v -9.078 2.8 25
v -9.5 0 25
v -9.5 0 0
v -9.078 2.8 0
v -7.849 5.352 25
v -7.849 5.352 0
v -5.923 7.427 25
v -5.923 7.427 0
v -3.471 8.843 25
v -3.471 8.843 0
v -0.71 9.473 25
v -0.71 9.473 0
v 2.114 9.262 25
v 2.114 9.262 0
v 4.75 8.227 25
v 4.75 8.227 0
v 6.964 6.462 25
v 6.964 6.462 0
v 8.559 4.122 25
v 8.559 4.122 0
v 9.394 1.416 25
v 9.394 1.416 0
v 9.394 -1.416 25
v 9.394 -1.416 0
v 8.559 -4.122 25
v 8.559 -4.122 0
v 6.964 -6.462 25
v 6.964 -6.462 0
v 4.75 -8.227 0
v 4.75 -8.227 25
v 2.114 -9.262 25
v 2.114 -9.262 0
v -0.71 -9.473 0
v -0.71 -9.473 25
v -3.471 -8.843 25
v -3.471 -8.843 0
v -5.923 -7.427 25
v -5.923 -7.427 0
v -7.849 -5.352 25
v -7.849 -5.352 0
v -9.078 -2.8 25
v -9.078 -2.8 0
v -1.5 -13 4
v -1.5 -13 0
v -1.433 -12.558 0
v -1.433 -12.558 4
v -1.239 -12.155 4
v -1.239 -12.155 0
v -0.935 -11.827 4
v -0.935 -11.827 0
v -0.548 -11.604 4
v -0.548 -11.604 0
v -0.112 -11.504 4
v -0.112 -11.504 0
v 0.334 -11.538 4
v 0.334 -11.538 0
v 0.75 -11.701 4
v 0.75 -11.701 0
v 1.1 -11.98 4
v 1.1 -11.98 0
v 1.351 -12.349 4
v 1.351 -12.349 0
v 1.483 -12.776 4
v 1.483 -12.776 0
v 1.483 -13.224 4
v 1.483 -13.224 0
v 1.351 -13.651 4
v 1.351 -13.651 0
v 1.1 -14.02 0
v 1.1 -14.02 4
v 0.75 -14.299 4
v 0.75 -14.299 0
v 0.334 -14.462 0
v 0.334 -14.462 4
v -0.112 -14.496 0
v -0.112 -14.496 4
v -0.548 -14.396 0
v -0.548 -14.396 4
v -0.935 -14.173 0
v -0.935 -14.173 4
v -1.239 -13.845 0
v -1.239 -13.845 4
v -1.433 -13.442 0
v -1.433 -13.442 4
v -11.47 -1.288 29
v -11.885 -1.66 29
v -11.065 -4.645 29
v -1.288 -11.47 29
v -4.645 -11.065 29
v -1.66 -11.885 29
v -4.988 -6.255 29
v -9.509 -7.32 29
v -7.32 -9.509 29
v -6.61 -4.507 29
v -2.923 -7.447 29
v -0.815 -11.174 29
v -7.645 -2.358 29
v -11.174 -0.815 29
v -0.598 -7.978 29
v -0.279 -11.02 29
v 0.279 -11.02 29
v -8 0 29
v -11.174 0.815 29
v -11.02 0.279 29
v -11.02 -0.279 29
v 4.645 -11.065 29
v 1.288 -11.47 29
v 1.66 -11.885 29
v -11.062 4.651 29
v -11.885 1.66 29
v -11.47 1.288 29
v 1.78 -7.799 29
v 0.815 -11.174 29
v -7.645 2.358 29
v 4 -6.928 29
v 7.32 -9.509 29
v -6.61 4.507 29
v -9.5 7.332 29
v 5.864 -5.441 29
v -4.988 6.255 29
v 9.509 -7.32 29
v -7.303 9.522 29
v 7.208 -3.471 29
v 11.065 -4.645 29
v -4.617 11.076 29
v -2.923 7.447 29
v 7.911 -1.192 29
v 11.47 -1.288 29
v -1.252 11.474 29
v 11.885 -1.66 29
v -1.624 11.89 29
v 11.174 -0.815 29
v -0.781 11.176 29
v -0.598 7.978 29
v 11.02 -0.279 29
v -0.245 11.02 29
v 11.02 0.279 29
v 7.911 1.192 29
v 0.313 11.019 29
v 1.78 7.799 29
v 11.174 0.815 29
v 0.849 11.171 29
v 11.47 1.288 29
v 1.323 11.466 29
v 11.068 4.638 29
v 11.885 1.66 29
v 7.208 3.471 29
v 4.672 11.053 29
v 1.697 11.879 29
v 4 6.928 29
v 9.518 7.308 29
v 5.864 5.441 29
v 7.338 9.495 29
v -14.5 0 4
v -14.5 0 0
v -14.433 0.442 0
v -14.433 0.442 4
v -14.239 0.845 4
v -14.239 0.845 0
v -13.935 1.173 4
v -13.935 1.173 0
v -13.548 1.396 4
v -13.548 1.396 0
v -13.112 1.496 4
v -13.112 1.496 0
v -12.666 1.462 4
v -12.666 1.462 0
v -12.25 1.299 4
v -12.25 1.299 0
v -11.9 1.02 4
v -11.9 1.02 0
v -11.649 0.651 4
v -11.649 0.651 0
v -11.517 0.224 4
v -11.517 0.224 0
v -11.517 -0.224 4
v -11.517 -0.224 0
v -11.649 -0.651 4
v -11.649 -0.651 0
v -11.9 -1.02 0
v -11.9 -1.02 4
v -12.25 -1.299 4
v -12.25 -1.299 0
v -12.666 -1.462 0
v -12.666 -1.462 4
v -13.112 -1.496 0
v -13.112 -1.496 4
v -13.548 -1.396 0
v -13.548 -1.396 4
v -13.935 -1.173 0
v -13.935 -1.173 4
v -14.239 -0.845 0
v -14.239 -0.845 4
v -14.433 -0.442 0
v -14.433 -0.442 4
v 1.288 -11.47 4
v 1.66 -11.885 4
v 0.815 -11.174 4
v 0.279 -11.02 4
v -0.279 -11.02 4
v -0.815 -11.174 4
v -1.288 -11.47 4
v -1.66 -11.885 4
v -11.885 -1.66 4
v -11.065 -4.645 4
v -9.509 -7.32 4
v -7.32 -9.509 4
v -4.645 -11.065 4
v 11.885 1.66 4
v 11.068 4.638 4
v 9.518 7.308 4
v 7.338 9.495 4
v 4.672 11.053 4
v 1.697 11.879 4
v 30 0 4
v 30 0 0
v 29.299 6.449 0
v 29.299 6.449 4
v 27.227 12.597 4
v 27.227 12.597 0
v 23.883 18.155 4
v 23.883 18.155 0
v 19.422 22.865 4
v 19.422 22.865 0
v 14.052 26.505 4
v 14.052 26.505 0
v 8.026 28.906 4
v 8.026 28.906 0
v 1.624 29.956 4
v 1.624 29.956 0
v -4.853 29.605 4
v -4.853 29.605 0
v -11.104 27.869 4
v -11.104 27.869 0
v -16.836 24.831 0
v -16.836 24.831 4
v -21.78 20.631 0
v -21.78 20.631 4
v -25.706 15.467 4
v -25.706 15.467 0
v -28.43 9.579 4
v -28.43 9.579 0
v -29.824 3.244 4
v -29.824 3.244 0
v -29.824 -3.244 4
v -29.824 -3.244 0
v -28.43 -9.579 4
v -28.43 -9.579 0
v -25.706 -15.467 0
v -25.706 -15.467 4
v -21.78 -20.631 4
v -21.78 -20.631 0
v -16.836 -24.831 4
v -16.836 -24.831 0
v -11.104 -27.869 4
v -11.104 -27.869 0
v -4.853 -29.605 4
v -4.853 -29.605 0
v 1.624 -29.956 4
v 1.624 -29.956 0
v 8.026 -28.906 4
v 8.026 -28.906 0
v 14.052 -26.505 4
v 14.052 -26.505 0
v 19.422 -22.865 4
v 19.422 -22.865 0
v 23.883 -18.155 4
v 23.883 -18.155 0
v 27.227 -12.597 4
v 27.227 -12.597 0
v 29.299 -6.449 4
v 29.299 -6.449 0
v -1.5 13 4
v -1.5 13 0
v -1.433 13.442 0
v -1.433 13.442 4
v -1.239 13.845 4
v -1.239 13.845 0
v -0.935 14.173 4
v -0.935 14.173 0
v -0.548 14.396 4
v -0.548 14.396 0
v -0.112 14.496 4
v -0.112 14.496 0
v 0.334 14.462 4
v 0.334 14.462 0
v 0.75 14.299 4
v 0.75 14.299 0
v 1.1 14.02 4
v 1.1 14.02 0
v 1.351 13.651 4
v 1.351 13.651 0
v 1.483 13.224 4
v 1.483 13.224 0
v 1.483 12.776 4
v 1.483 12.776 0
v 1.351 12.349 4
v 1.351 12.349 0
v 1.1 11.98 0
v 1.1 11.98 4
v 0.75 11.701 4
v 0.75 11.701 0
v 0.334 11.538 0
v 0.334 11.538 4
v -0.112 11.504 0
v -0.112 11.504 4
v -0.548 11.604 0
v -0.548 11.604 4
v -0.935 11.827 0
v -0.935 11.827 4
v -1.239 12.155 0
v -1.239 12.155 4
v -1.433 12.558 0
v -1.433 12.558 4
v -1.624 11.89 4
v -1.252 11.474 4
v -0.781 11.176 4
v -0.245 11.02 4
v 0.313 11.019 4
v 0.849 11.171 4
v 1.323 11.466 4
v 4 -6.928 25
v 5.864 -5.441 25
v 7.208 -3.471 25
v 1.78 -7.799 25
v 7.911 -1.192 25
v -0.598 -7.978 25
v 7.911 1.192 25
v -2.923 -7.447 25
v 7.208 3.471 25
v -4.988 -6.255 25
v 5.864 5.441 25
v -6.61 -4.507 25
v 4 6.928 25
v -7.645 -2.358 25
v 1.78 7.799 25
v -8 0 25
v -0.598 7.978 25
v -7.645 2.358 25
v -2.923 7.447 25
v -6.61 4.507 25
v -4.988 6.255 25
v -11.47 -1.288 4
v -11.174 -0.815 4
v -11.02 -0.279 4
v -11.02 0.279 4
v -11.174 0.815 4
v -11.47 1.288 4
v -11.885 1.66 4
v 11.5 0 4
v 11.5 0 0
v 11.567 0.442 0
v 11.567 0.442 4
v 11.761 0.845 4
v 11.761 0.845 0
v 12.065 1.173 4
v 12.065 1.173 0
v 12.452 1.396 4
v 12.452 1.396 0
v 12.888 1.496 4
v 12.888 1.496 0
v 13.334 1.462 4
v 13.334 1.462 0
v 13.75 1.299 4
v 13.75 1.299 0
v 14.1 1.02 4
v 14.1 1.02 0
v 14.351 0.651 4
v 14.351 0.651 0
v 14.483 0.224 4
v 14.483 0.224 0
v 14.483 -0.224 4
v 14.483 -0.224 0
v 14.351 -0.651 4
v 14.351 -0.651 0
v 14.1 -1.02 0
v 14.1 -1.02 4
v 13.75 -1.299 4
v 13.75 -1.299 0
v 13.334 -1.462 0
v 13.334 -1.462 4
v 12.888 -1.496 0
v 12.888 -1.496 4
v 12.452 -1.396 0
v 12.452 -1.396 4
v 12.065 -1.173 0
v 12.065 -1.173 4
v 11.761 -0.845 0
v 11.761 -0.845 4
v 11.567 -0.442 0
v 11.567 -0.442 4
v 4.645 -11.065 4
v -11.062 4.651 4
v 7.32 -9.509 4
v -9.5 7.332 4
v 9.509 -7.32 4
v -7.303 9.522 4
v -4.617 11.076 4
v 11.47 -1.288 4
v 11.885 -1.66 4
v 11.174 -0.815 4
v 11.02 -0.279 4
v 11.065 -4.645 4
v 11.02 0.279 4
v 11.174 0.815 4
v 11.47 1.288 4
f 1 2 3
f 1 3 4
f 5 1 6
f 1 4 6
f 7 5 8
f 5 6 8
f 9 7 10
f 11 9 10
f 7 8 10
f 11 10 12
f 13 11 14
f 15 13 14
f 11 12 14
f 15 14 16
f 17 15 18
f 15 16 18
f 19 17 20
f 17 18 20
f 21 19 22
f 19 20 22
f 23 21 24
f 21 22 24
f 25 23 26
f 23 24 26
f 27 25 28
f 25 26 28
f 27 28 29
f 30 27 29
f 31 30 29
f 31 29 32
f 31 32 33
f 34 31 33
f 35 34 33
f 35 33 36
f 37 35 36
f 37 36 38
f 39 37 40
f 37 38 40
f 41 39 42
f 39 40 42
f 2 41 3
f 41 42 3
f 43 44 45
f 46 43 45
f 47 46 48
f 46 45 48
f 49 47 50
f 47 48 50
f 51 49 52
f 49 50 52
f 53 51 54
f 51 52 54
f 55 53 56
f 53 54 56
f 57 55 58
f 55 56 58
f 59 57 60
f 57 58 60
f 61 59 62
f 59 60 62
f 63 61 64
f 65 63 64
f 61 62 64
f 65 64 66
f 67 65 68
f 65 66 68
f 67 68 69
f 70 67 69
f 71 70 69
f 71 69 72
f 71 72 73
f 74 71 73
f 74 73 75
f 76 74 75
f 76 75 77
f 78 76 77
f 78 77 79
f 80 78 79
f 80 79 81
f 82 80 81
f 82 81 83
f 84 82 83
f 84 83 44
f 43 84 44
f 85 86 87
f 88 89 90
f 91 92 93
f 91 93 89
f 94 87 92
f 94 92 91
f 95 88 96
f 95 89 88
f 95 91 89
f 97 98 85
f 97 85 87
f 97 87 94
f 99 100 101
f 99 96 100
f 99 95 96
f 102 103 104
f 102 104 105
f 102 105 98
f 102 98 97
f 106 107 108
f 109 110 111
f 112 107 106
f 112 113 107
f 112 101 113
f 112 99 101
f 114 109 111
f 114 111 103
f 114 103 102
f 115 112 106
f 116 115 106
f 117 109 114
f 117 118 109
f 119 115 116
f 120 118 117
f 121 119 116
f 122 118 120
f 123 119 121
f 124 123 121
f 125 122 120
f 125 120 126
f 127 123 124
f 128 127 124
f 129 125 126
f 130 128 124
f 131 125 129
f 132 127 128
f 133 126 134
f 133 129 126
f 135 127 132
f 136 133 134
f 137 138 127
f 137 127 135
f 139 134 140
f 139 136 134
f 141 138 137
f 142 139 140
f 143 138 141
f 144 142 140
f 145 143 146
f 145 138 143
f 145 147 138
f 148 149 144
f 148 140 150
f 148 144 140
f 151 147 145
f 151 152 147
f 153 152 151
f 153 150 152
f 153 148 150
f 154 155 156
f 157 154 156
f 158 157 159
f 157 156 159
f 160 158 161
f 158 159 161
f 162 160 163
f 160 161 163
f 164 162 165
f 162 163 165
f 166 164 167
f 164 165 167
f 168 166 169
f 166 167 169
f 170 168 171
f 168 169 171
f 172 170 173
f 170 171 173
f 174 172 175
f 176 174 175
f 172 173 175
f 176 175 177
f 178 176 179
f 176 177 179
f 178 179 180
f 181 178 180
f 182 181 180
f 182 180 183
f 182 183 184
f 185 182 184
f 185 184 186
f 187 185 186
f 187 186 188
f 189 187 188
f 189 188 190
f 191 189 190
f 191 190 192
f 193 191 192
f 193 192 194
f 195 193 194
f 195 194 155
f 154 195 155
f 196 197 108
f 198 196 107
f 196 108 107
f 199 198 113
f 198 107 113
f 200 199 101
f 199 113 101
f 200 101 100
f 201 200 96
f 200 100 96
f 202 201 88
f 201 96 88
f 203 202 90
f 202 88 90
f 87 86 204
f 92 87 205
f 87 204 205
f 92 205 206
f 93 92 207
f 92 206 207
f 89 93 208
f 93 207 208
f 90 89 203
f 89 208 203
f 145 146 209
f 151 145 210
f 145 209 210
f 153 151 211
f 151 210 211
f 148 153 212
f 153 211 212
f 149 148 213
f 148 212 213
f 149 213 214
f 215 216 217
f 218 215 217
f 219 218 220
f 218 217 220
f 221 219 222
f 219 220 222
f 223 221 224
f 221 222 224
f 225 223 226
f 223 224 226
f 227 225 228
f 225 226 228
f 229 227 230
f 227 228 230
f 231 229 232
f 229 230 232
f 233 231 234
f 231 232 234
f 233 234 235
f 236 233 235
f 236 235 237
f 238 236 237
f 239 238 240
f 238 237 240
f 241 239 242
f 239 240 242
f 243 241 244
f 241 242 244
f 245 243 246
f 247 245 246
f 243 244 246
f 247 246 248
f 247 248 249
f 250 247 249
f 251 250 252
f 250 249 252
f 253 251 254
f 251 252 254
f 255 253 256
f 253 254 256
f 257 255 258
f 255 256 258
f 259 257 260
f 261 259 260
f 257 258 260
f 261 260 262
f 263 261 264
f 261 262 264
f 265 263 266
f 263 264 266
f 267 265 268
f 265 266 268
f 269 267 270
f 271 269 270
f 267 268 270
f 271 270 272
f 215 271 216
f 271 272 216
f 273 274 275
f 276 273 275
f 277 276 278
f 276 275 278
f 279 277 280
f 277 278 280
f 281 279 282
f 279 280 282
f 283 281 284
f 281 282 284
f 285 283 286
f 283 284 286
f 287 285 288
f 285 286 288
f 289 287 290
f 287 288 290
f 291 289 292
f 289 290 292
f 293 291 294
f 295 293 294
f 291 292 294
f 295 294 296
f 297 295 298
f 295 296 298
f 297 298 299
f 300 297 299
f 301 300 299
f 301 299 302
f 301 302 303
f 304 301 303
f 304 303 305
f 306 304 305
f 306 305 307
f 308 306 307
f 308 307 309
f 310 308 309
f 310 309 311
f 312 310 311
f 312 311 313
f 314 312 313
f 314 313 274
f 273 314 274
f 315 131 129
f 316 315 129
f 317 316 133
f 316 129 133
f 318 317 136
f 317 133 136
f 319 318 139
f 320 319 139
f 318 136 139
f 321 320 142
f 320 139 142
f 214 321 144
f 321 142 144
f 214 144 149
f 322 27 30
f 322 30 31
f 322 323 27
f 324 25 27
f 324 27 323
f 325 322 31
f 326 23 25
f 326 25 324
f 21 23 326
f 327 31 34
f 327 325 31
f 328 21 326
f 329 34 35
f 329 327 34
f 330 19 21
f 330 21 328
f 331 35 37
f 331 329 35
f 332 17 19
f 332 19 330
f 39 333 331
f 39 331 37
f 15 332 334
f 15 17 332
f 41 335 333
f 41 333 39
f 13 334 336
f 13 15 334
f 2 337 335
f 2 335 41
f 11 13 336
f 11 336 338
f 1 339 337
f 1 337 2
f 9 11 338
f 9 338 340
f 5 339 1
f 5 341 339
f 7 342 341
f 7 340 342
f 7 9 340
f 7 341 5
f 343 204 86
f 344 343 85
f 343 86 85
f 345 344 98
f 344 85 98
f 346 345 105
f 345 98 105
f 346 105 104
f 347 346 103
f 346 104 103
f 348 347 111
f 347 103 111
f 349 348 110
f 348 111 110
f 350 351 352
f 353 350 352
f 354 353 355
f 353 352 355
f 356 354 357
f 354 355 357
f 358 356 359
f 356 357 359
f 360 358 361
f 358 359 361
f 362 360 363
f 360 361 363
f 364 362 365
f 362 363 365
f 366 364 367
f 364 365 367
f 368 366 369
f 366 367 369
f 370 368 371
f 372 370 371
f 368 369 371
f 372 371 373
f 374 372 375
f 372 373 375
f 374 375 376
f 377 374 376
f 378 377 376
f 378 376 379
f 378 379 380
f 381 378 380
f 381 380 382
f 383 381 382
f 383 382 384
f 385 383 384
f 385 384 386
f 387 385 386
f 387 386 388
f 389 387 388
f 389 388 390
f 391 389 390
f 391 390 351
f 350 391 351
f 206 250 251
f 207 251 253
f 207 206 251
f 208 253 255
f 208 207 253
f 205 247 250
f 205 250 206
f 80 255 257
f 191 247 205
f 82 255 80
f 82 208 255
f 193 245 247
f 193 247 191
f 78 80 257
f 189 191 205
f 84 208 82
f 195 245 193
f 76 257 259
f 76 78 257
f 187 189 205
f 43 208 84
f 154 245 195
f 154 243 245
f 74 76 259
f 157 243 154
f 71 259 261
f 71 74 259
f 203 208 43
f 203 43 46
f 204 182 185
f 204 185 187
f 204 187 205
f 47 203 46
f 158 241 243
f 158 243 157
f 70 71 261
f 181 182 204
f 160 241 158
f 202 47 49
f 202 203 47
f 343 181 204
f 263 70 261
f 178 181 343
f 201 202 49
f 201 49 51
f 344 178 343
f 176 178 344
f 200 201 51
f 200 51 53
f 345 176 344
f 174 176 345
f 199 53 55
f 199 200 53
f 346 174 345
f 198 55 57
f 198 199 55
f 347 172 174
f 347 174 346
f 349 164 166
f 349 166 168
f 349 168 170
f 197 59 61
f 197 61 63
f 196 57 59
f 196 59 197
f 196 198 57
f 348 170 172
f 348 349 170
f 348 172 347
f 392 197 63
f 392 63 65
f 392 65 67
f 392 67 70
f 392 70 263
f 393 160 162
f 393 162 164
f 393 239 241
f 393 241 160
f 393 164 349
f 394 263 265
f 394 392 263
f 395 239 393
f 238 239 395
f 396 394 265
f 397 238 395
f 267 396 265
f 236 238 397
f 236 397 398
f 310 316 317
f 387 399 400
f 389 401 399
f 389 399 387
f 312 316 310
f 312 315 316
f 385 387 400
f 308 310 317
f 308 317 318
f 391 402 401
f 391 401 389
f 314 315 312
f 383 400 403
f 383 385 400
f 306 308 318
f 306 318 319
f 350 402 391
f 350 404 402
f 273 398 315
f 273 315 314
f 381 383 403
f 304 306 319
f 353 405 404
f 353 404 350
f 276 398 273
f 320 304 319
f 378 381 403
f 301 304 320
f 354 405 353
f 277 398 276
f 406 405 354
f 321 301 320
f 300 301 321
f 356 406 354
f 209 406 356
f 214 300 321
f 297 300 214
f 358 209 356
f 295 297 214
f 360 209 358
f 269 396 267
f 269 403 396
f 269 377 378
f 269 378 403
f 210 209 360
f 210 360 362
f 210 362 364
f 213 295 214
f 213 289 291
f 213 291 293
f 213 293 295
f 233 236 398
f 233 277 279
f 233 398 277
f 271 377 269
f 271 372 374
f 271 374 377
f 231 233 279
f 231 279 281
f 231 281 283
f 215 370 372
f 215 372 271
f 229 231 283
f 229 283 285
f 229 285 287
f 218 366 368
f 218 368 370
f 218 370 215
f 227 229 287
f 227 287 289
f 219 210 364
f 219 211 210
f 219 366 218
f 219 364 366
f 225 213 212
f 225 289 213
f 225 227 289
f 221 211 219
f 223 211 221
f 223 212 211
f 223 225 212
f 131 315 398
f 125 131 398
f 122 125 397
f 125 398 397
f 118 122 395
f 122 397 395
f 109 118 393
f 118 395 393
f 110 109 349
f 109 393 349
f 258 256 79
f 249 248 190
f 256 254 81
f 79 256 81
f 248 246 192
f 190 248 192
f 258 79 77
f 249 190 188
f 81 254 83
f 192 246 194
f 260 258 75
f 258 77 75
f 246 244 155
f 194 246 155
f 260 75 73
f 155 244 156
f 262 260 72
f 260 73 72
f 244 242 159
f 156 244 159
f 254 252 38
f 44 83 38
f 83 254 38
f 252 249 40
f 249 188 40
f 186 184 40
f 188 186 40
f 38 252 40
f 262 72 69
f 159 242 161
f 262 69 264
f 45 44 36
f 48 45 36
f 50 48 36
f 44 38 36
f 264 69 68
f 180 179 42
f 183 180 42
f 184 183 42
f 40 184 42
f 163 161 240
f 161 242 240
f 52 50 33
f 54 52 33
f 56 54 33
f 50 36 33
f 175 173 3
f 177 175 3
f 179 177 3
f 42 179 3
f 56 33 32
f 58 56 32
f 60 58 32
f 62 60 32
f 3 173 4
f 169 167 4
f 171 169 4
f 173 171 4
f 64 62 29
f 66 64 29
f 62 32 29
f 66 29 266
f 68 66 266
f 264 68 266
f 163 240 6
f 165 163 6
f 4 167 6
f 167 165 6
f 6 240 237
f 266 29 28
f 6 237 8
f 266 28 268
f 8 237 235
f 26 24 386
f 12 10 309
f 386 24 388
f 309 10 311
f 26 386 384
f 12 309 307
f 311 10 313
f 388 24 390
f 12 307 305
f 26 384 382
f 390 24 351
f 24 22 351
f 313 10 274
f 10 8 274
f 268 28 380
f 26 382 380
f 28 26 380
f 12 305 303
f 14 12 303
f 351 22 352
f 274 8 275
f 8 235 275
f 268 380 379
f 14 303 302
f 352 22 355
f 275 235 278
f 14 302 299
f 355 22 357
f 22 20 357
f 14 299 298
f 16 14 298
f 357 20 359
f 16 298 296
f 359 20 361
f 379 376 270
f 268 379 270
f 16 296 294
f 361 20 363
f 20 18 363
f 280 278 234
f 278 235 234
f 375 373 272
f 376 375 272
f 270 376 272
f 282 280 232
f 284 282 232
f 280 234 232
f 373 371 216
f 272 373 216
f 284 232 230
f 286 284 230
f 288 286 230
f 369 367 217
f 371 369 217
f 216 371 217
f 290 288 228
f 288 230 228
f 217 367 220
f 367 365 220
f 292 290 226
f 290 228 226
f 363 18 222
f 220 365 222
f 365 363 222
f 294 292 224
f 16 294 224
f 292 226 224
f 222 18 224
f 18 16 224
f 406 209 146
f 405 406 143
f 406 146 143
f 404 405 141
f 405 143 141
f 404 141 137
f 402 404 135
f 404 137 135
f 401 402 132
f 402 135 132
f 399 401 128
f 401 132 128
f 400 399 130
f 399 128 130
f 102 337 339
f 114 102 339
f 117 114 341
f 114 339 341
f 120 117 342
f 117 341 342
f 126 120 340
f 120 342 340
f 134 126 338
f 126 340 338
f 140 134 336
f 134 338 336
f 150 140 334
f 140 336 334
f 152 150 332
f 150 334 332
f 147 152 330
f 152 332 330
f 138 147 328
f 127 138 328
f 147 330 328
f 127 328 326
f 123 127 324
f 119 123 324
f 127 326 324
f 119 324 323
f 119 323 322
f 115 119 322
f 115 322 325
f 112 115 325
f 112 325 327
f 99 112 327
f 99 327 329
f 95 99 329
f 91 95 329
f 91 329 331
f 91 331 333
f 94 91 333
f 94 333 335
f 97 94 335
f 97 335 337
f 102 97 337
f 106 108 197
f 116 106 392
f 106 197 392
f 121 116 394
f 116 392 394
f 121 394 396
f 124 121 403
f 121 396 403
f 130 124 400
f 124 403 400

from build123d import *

# Parameters (mm, degrees)
SKETCH2_R           = 30
BOSS_EXTRUDE1_DEPTH = 4
SKETCH3_R           = 12
BOSS_EXTRUDE2_DEPTH = 25
SKETCH4_R           = 9.5
CUT_EXTRUDE1_DEPTH  = 25
SKETCH5_R           = 8
CUT_EXTRUDE2_DEPTH  = 20
SKETCH6_R           = 1.5
CUT_EXTRUDE10_DEPTH = 4
SKETCH8_R           = 2
CUT_EXTRUDE14_DEPTH = 25


with BuildPart() as part:
    # Sketch2 → Boss-Extrude1 (new body)
    with BuildSketch(Plane.XY):
        Circle(SKETCH2_R)
    extrude(amount=BOSS_EXTRUDE1_DEPTH)

    # Sketch3 → Boss-Extrude2 (add)
    with BuildSketch(Plane.XY.offset(4)):
        Circle(SKETCH3_R)
    extrude(amount=BOSS_EXTRUDE2_DEPTH)

    # Sketch4 → Cut-Extrude1 (cut)
    with BuildSketch(Plane(origin=(0, 0, 0), x_dir=(-1, 0, 0), z_dir=(0, 0, -1))):
        Circle(SKETCH4_R)
    extrude(amount=-CUT_EXTRUDE1_DEPTH, mode=Mode.SUBTRACT)

    # Sketch5 → Cut-Extrude2 (cut)
    with BuildSketch(Plane(origin=(0, 0, 25), x_dir=(-1, 0, 0), z_dir=(0, 0, -1))):
        Circle(SKETCH5_R)
    extrude(amount=-CUT_EXTRUDE2_DEPTH, mode=Mode.SUBTRACT)

    # Sketch6 → Cut-Extrude10 (cut)
    with BuildSketch(Plane(origin=(0, 0, 0), x_dir=(-1, 0, 0), z_dir=(0, 0, -1))):
        with Locations((0, 13)):
            Circle(SKETCH6_R)
        with Locations((13, 0)):
            Circle(SKETCH6_R)
        with Locations((0, -13)):
            Circle(SKETCH6_R)
        with Locations((-13, 0)):
            Circle(SKETCH6_R)
    extrude(amount=-CUT_EXTRUDE10_DEPTH, mode=Mode.SUBTRACT)

    # Sketch8 → Cut-Extrude14 (cut)
    with BuildSketch(Plane.XY.offset(29)):
        with Locations((0.039889562, 13)):
            Circle(SKETCH8_R)
        with Locations((0, -13)):
            Circle(SKETCH8_R)
        with Locations((13, 0)):
            Circle(SKETCH8_R)
        with Locations((-13, 0)):
            Circle(SKETCH8_R)
    extrude(amount=-CUT_EXTRUDE14_DEPTH, mode=Mode.SUBTRACT)


solid = part.part
